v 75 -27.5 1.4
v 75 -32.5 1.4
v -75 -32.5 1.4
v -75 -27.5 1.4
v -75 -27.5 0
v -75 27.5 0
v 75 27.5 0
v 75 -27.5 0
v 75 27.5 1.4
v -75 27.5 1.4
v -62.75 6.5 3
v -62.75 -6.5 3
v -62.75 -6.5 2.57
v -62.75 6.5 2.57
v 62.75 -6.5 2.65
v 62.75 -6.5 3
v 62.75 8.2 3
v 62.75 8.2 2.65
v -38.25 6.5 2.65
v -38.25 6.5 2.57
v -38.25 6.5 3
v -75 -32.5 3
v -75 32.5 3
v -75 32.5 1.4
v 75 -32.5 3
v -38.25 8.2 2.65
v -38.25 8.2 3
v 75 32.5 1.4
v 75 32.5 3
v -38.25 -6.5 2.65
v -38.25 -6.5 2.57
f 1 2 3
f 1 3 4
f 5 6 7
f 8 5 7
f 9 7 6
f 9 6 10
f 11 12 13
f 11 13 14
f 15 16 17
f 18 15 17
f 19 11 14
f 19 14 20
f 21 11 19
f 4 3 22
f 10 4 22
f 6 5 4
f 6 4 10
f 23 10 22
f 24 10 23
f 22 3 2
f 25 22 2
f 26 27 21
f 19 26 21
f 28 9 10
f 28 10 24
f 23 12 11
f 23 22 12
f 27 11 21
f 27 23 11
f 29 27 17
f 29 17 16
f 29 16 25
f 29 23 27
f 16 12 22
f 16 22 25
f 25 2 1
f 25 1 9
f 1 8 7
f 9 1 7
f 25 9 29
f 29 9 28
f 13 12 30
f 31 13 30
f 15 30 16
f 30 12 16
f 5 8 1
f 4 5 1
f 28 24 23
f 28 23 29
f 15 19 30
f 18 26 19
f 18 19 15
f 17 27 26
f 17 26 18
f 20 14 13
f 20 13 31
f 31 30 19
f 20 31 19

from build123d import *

# Parameters (mm, degrees)
F0_W     = 150
F0_H     = 65
F1_DEPTH = 3
F3_W     = 5
F3_H     = 1.4
F4_DEPTH = 150.001
F2_W     = 101
F2_H     = 13
F2_H_2   = 1.7
F5_DEPTH = 0.35
F2_W_2   = 24.5
F6_DEPTH = 0.43


with BuildPart() as f1:
    # F0 (on Top) → F1 (new body)
    with BuildSketch(Plane.XY):
        Rectangle(F0_W, F0_H)
    extrude(amount=F1_DEPTH)

    # F3 (on face) → F4 (cut, through all)
    with BuildSketch(Plane.YZ.offset(75)):
        with Locations((-30, 0.7)):
            Rectangle(F3_W, F3_H)
        with Locations((30, 0.7)):
            Rectangle(F3_W, F3_H)
    extrude(amount=-F4_DEPTH, mode=Mode.SUBTRACT)

    # F2 (on face) → F5 (cut)
    with BuildSketch(Plane.XY.offset(3)):
        with Locations((12.25, 0)):
            Rectangle(F2_W, F2_H)
        with Locations((12.25, 7.35)):
            Rectangle(F2_W, F2_H_2)
    extrude(amount=-F5_DEPTH, mode=Mode.SUBTRACT)

    # F2 (on face) → F6 (cut)
    with BuildSketch(Plane.XY.offset(3)):
        with Locations((-50.5, 0)):
            Rectangle(F2_W_2, F2_H)
    extrude(amount=-F6_DEPTH, mode=Mode.SUBTRACT)


solid = f1.part
